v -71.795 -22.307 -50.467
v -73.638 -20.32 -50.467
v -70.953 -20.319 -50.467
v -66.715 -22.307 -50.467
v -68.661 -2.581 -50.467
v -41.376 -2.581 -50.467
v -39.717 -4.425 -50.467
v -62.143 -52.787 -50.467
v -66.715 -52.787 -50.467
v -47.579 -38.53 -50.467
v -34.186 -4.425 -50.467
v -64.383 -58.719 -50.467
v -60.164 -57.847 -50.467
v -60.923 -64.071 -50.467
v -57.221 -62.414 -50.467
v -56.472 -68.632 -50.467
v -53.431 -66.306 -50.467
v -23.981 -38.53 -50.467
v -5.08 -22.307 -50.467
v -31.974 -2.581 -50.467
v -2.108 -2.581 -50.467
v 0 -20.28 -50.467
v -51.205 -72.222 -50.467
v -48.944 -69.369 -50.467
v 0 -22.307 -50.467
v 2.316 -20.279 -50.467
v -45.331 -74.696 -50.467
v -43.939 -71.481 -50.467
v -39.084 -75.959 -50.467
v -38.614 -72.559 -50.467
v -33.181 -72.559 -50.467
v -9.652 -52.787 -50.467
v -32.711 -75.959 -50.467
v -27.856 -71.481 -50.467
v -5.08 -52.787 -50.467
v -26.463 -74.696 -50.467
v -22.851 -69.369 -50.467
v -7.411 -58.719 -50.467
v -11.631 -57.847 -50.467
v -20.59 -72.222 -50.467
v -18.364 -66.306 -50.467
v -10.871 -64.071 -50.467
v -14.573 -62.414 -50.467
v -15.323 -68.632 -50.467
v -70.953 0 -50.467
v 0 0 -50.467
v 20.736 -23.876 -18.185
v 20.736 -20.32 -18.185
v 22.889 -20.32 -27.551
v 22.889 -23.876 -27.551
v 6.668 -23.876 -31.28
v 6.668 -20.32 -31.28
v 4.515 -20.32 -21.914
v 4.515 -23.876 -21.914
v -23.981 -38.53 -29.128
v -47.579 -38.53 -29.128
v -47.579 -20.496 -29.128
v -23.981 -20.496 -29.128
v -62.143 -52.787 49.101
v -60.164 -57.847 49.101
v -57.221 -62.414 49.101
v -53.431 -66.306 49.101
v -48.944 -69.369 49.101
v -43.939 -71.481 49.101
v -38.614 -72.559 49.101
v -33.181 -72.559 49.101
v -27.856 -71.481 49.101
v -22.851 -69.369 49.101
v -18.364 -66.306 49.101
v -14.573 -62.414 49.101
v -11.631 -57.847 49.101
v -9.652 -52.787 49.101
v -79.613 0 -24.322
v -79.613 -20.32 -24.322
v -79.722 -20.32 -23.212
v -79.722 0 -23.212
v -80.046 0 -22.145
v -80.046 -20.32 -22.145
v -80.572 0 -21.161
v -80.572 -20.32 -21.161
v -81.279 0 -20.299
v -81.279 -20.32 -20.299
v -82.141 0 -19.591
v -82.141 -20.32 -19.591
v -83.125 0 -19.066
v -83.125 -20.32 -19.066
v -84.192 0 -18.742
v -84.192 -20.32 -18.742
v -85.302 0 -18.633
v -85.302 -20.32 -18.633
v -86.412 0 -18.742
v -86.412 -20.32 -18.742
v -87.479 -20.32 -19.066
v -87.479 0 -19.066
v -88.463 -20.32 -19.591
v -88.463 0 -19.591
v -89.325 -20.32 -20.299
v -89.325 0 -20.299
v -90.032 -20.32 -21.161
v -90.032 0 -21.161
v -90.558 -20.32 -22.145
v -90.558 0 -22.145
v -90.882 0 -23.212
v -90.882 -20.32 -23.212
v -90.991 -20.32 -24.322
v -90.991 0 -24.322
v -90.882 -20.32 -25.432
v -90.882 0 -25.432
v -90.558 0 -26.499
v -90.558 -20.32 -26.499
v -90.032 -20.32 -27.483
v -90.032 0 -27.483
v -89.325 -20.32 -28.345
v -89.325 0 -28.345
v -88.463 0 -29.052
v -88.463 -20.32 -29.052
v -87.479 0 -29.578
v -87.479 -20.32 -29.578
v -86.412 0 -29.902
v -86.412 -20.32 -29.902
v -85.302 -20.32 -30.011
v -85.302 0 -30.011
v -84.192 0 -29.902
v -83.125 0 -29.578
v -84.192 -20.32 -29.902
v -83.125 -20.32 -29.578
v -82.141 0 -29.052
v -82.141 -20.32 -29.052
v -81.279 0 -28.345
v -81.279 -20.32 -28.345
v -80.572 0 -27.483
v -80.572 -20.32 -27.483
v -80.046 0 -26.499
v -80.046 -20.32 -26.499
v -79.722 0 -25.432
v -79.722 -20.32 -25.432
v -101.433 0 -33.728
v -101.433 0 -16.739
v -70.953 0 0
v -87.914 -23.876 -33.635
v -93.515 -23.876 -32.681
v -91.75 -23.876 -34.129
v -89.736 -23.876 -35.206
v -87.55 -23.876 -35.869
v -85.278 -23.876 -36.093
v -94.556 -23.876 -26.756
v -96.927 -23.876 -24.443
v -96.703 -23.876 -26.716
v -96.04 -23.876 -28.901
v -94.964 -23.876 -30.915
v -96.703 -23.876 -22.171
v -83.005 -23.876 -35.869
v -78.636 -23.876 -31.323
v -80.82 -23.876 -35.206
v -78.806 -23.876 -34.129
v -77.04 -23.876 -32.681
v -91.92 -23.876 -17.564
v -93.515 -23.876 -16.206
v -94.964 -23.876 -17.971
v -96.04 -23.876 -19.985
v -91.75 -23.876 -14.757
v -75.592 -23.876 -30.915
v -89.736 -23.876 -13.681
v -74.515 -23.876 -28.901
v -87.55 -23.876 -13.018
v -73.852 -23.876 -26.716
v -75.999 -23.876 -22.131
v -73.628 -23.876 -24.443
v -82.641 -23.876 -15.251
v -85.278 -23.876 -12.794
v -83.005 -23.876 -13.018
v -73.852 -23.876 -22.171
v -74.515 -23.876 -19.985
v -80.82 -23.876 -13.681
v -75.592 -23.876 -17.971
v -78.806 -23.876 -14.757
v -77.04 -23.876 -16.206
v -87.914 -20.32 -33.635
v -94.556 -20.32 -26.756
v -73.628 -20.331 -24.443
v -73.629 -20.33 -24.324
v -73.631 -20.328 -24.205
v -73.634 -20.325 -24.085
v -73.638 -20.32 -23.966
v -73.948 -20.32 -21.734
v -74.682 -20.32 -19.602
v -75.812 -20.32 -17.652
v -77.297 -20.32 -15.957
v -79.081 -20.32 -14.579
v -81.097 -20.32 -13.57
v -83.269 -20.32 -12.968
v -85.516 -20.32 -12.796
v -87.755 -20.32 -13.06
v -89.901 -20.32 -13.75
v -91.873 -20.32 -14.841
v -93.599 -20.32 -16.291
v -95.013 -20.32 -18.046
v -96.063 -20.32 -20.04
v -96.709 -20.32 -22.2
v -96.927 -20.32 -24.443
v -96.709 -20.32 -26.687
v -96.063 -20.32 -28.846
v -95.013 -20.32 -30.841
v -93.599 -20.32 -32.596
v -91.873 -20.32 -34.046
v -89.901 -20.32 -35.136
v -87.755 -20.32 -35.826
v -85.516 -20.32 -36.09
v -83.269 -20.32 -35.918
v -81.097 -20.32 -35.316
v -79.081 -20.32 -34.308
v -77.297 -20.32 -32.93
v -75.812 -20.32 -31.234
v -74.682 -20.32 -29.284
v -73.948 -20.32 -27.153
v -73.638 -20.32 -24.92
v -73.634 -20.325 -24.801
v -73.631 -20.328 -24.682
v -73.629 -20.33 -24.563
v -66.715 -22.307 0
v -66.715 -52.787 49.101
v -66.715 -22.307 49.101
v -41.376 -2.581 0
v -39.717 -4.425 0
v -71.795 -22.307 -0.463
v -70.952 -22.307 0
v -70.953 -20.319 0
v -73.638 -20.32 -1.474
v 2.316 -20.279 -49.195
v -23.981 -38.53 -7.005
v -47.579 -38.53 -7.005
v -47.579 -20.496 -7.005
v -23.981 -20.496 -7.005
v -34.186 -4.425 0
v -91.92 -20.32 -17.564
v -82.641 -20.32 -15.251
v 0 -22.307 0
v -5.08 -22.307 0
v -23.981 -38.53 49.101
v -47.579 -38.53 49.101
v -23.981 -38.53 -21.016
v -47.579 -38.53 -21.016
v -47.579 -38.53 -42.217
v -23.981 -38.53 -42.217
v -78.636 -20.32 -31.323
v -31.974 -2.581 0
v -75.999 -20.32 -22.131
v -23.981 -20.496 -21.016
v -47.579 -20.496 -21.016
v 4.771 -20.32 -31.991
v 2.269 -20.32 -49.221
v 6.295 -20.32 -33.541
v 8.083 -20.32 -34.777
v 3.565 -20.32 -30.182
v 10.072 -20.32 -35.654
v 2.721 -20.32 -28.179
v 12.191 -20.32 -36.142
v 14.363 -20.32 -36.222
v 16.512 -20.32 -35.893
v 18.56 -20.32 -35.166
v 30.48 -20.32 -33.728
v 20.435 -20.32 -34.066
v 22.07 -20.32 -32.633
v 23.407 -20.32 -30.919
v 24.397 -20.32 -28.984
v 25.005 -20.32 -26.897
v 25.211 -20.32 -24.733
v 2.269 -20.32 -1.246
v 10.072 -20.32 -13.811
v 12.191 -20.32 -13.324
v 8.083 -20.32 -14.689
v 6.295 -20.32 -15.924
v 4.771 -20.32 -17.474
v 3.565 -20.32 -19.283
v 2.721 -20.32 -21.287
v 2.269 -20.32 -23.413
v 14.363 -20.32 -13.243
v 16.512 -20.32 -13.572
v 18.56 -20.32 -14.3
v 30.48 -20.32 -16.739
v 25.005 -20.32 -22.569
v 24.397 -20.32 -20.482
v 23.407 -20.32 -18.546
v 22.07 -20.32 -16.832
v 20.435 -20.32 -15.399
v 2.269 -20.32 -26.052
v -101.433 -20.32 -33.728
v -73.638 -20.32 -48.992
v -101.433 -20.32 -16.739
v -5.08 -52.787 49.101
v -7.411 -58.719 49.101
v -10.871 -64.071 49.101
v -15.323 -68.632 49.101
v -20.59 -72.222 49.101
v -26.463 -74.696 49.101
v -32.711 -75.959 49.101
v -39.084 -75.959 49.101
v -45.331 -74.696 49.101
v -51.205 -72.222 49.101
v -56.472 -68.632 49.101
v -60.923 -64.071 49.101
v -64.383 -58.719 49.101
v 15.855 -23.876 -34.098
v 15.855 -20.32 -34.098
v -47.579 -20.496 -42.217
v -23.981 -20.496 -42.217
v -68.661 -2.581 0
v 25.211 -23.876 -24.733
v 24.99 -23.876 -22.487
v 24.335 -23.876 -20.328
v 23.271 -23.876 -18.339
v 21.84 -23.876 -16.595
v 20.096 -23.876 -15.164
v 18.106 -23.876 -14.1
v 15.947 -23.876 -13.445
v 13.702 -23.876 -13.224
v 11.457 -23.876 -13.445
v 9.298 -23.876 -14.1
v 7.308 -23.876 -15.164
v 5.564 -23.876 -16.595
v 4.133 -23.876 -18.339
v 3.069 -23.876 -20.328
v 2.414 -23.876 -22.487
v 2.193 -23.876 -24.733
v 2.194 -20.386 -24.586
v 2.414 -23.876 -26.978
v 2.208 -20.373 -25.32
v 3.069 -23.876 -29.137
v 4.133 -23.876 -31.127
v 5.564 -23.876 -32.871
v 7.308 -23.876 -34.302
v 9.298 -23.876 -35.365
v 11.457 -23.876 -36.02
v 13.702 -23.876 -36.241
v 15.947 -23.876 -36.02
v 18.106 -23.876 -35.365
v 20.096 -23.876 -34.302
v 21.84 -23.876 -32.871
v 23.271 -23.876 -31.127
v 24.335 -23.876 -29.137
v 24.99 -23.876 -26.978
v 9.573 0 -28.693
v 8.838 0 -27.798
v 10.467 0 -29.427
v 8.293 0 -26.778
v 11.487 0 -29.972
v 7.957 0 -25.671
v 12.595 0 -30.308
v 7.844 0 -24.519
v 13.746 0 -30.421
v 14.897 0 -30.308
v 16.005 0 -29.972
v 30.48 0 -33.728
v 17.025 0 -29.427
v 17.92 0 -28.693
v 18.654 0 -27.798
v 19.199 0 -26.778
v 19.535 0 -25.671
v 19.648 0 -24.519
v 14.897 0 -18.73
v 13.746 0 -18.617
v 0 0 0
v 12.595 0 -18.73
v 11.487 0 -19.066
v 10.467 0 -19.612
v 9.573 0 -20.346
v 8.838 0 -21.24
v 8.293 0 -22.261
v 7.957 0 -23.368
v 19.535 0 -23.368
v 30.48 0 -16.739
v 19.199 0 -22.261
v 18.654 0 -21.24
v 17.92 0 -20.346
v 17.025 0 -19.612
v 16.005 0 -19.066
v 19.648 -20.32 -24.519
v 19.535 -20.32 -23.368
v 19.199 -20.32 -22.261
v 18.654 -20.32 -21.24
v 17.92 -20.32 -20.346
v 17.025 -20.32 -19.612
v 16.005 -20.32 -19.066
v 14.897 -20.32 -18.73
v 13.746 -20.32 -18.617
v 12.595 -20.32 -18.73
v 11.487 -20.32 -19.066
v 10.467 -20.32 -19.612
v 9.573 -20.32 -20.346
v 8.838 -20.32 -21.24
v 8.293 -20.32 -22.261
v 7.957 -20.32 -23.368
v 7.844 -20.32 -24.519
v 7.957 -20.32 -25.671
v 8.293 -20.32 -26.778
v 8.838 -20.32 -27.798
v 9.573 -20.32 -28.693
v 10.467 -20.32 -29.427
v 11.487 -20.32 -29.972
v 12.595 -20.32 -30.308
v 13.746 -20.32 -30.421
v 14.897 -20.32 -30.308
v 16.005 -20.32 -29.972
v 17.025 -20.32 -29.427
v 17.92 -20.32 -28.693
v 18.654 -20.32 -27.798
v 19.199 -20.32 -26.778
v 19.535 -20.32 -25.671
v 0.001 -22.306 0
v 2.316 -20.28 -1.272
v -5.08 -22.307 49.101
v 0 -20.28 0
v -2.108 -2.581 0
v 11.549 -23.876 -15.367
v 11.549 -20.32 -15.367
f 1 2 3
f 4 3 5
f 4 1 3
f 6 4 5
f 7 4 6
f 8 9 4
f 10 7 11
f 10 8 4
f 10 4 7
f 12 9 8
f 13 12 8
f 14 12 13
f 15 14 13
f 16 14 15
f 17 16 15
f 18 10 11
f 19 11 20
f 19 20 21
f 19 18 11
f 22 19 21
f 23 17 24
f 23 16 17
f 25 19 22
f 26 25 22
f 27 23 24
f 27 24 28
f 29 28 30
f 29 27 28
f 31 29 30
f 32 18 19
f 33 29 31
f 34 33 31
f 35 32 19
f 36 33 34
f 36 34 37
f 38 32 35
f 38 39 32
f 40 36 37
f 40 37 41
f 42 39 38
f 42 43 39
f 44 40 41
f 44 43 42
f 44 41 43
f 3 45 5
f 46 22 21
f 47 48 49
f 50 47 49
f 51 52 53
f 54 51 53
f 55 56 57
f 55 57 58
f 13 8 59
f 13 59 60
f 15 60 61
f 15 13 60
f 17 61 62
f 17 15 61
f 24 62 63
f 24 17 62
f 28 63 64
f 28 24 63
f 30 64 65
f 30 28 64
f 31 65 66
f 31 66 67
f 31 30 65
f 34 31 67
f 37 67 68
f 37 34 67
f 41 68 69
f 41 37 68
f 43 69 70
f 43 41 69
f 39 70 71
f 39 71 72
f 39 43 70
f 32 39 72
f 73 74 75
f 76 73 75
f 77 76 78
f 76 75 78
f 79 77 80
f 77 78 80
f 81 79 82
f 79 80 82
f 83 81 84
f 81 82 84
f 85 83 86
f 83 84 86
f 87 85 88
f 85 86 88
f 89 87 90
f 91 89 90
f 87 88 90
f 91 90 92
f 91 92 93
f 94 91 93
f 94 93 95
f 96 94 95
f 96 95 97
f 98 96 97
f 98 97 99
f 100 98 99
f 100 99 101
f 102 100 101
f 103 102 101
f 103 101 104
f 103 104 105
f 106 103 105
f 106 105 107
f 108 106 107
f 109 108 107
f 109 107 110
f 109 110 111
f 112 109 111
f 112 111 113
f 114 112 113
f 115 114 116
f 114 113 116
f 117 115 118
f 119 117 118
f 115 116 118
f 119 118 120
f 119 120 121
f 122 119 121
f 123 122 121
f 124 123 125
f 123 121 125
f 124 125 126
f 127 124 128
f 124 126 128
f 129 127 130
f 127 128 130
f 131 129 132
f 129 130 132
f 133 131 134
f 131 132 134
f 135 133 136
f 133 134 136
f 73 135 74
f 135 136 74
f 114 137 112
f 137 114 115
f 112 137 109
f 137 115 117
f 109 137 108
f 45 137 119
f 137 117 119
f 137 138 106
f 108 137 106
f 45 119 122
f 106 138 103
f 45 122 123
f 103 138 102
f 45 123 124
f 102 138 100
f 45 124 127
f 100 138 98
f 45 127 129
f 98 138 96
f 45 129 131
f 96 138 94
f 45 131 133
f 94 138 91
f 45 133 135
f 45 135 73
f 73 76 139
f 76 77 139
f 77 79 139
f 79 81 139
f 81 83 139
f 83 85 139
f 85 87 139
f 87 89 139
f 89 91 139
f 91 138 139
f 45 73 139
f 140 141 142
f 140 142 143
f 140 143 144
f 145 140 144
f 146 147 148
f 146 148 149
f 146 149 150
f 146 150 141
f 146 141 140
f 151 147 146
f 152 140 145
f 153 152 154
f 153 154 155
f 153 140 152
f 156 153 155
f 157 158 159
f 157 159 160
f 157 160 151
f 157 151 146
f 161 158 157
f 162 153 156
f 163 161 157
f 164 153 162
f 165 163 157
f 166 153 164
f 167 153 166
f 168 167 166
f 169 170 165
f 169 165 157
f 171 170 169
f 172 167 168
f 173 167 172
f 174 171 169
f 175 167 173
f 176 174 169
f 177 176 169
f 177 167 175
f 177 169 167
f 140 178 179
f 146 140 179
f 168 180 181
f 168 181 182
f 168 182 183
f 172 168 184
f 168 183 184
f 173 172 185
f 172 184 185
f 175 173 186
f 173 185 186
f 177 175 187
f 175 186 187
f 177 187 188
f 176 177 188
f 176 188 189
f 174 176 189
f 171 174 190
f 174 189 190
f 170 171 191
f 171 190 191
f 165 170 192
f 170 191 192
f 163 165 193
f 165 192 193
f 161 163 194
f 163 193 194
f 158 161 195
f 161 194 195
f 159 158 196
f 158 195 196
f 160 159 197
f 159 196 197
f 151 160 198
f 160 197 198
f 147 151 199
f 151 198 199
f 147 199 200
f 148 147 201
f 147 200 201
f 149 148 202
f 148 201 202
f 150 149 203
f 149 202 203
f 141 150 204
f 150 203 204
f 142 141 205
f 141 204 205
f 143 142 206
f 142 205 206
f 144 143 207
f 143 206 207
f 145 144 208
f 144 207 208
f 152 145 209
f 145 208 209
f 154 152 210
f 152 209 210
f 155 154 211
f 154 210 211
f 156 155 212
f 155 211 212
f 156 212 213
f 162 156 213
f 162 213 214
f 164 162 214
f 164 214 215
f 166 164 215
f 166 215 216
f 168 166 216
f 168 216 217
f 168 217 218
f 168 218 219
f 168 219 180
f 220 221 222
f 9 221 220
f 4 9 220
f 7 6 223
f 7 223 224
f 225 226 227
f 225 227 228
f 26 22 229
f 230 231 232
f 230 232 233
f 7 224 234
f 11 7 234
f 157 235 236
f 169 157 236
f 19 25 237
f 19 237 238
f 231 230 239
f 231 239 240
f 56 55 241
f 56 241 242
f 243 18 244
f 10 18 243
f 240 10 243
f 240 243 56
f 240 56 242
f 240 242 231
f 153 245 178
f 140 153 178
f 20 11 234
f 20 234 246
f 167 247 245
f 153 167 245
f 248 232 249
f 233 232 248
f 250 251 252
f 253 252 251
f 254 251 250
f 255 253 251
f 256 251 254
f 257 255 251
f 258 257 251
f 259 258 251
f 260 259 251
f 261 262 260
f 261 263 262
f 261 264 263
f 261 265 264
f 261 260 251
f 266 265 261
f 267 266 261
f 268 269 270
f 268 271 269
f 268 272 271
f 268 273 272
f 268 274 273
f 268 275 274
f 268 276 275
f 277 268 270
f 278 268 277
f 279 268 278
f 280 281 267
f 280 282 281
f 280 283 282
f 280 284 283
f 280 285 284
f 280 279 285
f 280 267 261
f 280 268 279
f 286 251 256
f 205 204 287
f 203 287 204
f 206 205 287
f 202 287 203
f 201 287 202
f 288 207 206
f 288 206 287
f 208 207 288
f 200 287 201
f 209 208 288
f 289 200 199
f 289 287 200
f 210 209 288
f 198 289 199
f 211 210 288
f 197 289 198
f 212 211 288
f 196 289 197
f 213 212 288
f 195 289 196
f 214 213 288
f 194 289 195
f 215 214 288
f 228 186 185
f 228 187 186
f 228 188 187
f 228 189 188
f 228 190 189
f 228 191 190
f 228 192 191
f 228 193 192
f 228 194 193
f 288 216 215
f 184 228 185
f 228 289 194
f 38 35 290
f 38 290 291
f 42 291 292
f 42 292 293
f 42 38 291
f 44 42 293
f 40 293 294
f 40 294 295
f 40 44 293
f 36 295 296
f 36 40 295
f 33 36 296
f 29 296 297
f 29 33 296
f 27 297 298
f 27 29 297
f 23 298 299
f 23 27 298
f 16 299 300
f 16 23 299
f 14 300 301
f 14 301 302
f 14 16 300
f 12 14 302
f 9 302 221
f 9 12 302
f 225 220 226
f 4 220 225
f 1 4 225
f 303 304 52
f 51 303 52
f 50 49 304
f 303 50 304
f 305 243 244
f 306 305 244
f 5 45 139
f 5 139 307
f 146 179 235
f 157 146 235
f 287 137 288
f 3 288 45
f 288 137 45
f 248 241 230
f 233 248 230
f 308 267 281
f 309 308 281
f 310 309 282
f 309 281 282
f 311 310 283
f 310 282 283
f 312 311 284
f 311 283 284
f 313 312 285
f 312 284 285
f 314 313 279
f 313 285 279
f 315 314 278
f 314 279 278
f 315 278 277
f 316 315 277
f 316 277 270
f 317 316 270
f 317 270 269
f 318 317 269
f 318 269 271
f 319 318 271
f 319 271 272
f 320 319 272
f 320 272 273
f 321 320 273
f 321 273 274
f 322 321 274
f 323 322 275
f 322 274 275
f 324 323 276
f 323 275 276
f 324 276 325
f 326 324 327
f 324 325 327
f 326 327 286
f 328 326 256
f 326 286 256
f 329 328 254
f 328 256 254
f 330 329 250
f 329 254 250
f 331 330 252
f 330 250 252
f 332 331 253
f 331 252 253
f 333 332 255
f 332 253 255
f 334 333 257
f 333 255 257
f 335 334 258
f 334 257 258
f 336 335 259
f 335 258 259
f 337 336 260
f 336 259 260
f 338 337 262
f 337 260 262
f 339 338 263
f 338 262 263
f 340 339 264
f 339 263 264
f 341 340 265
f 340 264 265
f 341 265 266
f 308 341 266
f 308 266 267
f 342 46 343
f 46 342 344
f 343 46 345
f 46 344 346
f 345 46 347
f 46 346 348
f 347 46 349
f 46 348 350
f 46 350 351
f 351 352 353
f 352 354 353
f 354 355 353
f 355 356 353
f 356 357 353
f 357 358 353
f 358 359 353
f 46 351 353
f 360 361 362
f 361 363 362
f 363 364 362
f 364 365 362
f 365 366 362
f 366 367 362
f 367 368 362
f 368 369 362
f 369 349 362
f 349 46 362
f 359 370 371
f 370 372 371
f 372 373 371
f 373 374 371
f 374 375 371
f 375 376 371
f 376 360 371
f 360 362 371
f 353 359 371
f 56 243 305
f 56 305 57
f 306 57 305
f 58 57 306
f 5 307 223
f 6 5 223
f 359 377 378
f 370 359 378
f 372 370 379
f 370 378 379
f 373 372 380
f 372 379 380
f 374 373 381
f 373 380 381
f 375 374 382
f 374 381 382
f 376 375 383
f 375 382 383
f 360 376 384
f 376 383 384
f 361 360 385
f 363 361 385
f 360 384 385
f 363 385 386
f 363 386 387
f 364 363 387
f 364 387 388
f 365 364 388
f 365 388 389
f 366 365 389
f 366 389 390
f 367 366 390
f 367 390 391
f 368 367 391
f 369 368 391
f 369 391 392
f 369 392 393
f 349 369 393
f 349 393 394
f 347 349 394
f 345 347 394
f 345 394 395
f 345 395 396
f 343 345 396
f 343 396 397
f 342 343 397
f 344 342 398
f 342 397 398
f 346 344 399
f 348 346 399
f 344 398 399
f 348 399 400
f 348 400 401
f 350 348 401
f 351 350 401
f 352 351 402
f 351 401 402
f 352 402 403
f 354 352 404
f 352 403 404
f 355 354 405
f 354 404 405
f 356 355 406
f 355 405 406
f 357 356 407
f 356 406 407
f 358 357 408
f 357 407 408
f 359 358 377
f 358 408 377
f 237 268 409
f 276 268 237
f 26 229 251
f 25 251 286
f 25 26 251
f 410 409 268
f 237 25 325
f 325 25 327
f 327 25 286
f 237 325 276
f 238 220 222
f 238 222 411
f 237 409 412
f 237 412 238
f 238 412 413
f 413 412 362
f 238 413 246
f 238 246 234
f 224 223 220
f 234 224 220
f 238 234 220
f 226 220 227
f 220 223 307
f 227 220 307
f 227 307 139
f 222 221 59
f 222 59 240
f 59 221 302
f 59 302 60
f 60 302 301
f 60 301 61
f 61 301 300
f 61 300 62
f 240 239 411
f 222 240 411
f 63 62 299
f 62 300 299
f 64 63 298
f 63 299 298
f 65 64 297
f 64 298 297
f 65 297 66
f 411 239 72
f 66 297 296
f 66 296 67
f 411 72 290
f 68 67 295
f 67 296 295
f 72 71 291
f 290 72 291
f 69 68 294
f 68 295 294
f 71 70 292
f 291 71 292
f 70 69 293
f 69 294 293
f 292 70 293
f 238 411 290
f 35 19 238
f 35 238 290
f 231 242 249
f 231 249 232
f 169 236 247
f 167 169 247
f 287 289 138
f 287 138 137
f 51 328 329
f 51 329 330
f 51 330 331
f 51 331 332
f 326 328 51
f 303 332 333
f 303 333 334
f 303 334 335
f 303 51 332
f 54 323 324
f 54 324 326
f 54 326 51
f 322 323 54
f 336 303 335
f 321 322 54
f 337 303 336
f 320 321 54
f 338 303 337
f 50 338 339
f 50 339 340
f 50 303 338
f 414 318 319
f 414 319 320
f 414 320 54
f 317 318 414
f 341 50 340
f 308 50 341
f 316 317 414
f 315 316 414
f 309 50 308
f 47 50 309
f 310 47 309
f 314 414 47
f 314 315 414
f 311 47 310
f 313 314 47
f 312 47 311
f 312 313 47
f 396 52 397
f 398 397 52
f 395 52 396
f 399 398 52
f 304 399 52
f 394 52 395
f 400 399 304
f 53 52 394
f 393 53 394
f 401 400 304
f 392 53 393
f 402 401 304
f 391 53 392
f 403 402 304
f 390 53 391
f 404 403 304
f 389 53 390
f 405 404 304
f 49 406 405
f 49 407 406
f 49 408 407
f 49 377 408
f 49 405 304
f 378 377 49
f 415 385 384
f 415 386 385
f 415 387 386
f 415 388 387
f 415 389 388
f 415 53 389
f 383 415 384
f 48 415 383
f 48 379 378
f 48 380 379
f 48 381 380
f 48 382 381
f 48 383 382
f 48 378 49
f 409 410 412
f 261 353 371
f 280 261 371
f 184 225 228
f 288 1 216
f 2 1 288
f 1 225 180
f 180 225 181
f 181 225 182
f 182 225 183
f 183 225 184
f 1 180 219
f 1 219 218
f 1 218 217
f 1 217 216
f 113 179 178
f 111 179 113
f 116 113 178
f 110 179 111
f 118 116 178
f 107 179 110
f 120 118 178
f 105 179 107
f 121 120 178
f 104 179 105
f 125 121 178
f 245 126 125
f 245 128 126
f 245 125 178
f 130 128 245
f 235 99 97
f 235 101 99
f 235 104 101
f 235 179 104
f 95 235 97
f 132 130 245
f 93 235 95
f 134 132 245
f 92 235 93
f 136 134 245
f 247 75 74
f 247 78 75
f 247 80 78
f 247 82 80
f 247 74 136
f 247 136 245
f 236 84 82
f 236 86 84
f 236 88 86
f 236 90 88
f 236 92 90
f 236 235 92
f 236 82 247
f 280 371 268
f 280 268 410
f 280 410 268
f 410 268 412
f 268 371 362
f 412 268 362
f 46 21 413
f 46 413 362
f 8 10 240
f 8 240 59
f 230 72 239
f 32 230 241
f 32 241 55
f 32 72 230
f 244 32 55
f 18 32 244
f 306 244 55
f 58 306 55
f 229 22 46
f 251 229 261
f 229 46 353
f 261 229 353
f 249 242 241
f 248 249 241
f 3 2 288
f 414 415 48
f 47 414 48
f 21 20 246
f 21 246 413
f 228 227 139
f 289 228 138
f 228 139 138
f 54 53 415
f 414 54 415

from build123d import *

# Parameters (mm, degrees)
F1_DEPTH  = 20.32
F3_DEPTH  = 53.848
F5_DEPTH  = 25.4
F7_DEPTH  = 54.356
F8_R      = 11.508682
F8_R_2    = 11.649308
F9_DEPTH  = 3.556
F10_R     = 5.689176
F10_R_2   = 5.902235
F11_DEPTH = 29.972
F13_DEPTH = 99.568
F14_W     = 23.597419
F14_H     = 13.089193
F14_H_2   = 14.010968
F15_DEPTH = 18.034
F17_DEPTH = 99.568


with BuildPart() as f1:
    # F0 (on Front) → F1 (new body)
    with BuildSketch(Plane.XZ):
        Polygon((0, 0), (-70.953442, 0), (-101.433442, -16.739016), (-101.433442, -33.727869), (-70.953442, -50.466886), (0, -50.466886), (30.48, -33.727869), (30.48, -16.739016), align=None)
    extrude(amount=F1_DEPTH)

    # F2 (on face) → F3 (join)
    with BuildSketch(Plane(origin=(0, 0, -50.466886), x_dir=(1, 0, 0), z_dir=(0, 0, -1))):
        Polygon((-73.638171, 20.32), (2.316022, 20.279033), (0, 22.306934), (-71.794622, 22.306934), align=None)
    extrude(amount=-F3_DEPTH)

    # F4 (on face) → F5 (cut)
    with BuildSketch(Plane(origin=(0.010938, -20.280276, 0), x_dir=(-1, -0.000539, 0), z_dir=(-0.000539, 1, 0))):
        Polygon((70.964391, 0), (73.64912, -1.4744), (73.64912, 3.381114), (-2.305084, 3.381114), (-2.305084, -1.271914), (0.010938, 0), align=None)
    extrude(amount=-F5_DEPTH, mode=Mode.SUBTRACT)

    # F6 (on face) → F7 (cut)
    with BuildSketch(Plane.XY):
        Polygon((-2.108495, -2.580968), (0, 0), (-70.953442, 0), (-68.660595, -2.580968), (-41.376077, -2.580968), (-39.716881, -4.424516), (-34.186237, -4.424516), (-31.973977, -2.580968), align=None)
    extrude(amount=-F7_DEPTH, mode=Mode.SUBTRACT)

    # F8 (on face) → F9 (join)
    with BuildSketch(Plane.XZ.offset(20.32)):
        with Locations((13.702015, -24.732648)):
            Circle(F8_R)
        Polygon((4.514804, -21.914458), (11.549033, -15.367195), (20.736244, -18.185385), (22.889225, -27.550837), (15.854996, -34.0981), (6.667786, -31.279911), align=None, mode=Mode.SUBTRACT)
        with Locations((-85.277705, -24.443241)):
            Circle(F8_R_2)
        Polygon((-94.556486, -26.755789), (-91.919821, -17.563855), (-82.641039, -15.251307), (-75.998923, -22.130693), (-78.635589, -31.322628), (-87.91437, -33.635176), align=None, mode=Mode.SUBTRACT)
    extrude(amount=F9_DEPTH)

    # F10 (on face) → F11 (cut)
    with BuildSketch(Plane.XZ.offset(20.32)):
        with Locations((-85.302033, -24.321858)):
            Circle(F10_R)
        with Locations((13.746024, -24.519194)):
            Circle(F10_R_2)
    extrude(amount=-F11_DEPTH, mode=Mode.SUBTRACT)

    # F12 (on face) → F13 (join)
    with BuildSketch(Plane(origin=(0, 0, -50.466886), x_dir=(1, 0, 0), z_dir=(0, 0, -1))):
        Polygon((-66.714622, 52.786934), (-66.714622, 22.306934), (-5.08, 22.306934), (-5.08, 52.786934), (-9.652, 52.786934), (-23.981169, 38.53016), (-47.578588, 38.53016), (-62.142622, 52.786934), align=None)
    extrude(amount=-F13_DEPTH)

    # F14 (on face) → F15 (cut)
    with BuildSketch(Plane.XZ.offset(38.53016)):
        with Locations((-35.779878, -35.672662)):
            Rectangle(F14_W, F14_H)
        with Locations((-35.779878, -14.010968)):
            Rectangle(F14_W, F14_H_2)
    extrude(amount=-F15_DEPTH, mode=Mode.SUBTRACT)

    # F16 (on face) → F17 (join)
    with BuildSketch(Plane(origin=(0, 0, -50.466886), x_dir=(1, 0, 0), z_dir=(0, 0, -1))):
        with BuildLine():
            Line((-9.652, 52.786934), (-5.08, 52.786934))
            ThreePointArc((-5.08, 52.786934), (-35.897311, 76.1177), (-66.714622, 52.786934))
            Line((-66.714622, 52.786934), (-62.142622, 52.786934))
            ThreePointArc((-62.142622, 52.786934), (-35.897311, 72.694804), (-9.652, 52.786934))
        make_face()
    extrude(amount=-F17_DEPTH)


solid = f1.part
